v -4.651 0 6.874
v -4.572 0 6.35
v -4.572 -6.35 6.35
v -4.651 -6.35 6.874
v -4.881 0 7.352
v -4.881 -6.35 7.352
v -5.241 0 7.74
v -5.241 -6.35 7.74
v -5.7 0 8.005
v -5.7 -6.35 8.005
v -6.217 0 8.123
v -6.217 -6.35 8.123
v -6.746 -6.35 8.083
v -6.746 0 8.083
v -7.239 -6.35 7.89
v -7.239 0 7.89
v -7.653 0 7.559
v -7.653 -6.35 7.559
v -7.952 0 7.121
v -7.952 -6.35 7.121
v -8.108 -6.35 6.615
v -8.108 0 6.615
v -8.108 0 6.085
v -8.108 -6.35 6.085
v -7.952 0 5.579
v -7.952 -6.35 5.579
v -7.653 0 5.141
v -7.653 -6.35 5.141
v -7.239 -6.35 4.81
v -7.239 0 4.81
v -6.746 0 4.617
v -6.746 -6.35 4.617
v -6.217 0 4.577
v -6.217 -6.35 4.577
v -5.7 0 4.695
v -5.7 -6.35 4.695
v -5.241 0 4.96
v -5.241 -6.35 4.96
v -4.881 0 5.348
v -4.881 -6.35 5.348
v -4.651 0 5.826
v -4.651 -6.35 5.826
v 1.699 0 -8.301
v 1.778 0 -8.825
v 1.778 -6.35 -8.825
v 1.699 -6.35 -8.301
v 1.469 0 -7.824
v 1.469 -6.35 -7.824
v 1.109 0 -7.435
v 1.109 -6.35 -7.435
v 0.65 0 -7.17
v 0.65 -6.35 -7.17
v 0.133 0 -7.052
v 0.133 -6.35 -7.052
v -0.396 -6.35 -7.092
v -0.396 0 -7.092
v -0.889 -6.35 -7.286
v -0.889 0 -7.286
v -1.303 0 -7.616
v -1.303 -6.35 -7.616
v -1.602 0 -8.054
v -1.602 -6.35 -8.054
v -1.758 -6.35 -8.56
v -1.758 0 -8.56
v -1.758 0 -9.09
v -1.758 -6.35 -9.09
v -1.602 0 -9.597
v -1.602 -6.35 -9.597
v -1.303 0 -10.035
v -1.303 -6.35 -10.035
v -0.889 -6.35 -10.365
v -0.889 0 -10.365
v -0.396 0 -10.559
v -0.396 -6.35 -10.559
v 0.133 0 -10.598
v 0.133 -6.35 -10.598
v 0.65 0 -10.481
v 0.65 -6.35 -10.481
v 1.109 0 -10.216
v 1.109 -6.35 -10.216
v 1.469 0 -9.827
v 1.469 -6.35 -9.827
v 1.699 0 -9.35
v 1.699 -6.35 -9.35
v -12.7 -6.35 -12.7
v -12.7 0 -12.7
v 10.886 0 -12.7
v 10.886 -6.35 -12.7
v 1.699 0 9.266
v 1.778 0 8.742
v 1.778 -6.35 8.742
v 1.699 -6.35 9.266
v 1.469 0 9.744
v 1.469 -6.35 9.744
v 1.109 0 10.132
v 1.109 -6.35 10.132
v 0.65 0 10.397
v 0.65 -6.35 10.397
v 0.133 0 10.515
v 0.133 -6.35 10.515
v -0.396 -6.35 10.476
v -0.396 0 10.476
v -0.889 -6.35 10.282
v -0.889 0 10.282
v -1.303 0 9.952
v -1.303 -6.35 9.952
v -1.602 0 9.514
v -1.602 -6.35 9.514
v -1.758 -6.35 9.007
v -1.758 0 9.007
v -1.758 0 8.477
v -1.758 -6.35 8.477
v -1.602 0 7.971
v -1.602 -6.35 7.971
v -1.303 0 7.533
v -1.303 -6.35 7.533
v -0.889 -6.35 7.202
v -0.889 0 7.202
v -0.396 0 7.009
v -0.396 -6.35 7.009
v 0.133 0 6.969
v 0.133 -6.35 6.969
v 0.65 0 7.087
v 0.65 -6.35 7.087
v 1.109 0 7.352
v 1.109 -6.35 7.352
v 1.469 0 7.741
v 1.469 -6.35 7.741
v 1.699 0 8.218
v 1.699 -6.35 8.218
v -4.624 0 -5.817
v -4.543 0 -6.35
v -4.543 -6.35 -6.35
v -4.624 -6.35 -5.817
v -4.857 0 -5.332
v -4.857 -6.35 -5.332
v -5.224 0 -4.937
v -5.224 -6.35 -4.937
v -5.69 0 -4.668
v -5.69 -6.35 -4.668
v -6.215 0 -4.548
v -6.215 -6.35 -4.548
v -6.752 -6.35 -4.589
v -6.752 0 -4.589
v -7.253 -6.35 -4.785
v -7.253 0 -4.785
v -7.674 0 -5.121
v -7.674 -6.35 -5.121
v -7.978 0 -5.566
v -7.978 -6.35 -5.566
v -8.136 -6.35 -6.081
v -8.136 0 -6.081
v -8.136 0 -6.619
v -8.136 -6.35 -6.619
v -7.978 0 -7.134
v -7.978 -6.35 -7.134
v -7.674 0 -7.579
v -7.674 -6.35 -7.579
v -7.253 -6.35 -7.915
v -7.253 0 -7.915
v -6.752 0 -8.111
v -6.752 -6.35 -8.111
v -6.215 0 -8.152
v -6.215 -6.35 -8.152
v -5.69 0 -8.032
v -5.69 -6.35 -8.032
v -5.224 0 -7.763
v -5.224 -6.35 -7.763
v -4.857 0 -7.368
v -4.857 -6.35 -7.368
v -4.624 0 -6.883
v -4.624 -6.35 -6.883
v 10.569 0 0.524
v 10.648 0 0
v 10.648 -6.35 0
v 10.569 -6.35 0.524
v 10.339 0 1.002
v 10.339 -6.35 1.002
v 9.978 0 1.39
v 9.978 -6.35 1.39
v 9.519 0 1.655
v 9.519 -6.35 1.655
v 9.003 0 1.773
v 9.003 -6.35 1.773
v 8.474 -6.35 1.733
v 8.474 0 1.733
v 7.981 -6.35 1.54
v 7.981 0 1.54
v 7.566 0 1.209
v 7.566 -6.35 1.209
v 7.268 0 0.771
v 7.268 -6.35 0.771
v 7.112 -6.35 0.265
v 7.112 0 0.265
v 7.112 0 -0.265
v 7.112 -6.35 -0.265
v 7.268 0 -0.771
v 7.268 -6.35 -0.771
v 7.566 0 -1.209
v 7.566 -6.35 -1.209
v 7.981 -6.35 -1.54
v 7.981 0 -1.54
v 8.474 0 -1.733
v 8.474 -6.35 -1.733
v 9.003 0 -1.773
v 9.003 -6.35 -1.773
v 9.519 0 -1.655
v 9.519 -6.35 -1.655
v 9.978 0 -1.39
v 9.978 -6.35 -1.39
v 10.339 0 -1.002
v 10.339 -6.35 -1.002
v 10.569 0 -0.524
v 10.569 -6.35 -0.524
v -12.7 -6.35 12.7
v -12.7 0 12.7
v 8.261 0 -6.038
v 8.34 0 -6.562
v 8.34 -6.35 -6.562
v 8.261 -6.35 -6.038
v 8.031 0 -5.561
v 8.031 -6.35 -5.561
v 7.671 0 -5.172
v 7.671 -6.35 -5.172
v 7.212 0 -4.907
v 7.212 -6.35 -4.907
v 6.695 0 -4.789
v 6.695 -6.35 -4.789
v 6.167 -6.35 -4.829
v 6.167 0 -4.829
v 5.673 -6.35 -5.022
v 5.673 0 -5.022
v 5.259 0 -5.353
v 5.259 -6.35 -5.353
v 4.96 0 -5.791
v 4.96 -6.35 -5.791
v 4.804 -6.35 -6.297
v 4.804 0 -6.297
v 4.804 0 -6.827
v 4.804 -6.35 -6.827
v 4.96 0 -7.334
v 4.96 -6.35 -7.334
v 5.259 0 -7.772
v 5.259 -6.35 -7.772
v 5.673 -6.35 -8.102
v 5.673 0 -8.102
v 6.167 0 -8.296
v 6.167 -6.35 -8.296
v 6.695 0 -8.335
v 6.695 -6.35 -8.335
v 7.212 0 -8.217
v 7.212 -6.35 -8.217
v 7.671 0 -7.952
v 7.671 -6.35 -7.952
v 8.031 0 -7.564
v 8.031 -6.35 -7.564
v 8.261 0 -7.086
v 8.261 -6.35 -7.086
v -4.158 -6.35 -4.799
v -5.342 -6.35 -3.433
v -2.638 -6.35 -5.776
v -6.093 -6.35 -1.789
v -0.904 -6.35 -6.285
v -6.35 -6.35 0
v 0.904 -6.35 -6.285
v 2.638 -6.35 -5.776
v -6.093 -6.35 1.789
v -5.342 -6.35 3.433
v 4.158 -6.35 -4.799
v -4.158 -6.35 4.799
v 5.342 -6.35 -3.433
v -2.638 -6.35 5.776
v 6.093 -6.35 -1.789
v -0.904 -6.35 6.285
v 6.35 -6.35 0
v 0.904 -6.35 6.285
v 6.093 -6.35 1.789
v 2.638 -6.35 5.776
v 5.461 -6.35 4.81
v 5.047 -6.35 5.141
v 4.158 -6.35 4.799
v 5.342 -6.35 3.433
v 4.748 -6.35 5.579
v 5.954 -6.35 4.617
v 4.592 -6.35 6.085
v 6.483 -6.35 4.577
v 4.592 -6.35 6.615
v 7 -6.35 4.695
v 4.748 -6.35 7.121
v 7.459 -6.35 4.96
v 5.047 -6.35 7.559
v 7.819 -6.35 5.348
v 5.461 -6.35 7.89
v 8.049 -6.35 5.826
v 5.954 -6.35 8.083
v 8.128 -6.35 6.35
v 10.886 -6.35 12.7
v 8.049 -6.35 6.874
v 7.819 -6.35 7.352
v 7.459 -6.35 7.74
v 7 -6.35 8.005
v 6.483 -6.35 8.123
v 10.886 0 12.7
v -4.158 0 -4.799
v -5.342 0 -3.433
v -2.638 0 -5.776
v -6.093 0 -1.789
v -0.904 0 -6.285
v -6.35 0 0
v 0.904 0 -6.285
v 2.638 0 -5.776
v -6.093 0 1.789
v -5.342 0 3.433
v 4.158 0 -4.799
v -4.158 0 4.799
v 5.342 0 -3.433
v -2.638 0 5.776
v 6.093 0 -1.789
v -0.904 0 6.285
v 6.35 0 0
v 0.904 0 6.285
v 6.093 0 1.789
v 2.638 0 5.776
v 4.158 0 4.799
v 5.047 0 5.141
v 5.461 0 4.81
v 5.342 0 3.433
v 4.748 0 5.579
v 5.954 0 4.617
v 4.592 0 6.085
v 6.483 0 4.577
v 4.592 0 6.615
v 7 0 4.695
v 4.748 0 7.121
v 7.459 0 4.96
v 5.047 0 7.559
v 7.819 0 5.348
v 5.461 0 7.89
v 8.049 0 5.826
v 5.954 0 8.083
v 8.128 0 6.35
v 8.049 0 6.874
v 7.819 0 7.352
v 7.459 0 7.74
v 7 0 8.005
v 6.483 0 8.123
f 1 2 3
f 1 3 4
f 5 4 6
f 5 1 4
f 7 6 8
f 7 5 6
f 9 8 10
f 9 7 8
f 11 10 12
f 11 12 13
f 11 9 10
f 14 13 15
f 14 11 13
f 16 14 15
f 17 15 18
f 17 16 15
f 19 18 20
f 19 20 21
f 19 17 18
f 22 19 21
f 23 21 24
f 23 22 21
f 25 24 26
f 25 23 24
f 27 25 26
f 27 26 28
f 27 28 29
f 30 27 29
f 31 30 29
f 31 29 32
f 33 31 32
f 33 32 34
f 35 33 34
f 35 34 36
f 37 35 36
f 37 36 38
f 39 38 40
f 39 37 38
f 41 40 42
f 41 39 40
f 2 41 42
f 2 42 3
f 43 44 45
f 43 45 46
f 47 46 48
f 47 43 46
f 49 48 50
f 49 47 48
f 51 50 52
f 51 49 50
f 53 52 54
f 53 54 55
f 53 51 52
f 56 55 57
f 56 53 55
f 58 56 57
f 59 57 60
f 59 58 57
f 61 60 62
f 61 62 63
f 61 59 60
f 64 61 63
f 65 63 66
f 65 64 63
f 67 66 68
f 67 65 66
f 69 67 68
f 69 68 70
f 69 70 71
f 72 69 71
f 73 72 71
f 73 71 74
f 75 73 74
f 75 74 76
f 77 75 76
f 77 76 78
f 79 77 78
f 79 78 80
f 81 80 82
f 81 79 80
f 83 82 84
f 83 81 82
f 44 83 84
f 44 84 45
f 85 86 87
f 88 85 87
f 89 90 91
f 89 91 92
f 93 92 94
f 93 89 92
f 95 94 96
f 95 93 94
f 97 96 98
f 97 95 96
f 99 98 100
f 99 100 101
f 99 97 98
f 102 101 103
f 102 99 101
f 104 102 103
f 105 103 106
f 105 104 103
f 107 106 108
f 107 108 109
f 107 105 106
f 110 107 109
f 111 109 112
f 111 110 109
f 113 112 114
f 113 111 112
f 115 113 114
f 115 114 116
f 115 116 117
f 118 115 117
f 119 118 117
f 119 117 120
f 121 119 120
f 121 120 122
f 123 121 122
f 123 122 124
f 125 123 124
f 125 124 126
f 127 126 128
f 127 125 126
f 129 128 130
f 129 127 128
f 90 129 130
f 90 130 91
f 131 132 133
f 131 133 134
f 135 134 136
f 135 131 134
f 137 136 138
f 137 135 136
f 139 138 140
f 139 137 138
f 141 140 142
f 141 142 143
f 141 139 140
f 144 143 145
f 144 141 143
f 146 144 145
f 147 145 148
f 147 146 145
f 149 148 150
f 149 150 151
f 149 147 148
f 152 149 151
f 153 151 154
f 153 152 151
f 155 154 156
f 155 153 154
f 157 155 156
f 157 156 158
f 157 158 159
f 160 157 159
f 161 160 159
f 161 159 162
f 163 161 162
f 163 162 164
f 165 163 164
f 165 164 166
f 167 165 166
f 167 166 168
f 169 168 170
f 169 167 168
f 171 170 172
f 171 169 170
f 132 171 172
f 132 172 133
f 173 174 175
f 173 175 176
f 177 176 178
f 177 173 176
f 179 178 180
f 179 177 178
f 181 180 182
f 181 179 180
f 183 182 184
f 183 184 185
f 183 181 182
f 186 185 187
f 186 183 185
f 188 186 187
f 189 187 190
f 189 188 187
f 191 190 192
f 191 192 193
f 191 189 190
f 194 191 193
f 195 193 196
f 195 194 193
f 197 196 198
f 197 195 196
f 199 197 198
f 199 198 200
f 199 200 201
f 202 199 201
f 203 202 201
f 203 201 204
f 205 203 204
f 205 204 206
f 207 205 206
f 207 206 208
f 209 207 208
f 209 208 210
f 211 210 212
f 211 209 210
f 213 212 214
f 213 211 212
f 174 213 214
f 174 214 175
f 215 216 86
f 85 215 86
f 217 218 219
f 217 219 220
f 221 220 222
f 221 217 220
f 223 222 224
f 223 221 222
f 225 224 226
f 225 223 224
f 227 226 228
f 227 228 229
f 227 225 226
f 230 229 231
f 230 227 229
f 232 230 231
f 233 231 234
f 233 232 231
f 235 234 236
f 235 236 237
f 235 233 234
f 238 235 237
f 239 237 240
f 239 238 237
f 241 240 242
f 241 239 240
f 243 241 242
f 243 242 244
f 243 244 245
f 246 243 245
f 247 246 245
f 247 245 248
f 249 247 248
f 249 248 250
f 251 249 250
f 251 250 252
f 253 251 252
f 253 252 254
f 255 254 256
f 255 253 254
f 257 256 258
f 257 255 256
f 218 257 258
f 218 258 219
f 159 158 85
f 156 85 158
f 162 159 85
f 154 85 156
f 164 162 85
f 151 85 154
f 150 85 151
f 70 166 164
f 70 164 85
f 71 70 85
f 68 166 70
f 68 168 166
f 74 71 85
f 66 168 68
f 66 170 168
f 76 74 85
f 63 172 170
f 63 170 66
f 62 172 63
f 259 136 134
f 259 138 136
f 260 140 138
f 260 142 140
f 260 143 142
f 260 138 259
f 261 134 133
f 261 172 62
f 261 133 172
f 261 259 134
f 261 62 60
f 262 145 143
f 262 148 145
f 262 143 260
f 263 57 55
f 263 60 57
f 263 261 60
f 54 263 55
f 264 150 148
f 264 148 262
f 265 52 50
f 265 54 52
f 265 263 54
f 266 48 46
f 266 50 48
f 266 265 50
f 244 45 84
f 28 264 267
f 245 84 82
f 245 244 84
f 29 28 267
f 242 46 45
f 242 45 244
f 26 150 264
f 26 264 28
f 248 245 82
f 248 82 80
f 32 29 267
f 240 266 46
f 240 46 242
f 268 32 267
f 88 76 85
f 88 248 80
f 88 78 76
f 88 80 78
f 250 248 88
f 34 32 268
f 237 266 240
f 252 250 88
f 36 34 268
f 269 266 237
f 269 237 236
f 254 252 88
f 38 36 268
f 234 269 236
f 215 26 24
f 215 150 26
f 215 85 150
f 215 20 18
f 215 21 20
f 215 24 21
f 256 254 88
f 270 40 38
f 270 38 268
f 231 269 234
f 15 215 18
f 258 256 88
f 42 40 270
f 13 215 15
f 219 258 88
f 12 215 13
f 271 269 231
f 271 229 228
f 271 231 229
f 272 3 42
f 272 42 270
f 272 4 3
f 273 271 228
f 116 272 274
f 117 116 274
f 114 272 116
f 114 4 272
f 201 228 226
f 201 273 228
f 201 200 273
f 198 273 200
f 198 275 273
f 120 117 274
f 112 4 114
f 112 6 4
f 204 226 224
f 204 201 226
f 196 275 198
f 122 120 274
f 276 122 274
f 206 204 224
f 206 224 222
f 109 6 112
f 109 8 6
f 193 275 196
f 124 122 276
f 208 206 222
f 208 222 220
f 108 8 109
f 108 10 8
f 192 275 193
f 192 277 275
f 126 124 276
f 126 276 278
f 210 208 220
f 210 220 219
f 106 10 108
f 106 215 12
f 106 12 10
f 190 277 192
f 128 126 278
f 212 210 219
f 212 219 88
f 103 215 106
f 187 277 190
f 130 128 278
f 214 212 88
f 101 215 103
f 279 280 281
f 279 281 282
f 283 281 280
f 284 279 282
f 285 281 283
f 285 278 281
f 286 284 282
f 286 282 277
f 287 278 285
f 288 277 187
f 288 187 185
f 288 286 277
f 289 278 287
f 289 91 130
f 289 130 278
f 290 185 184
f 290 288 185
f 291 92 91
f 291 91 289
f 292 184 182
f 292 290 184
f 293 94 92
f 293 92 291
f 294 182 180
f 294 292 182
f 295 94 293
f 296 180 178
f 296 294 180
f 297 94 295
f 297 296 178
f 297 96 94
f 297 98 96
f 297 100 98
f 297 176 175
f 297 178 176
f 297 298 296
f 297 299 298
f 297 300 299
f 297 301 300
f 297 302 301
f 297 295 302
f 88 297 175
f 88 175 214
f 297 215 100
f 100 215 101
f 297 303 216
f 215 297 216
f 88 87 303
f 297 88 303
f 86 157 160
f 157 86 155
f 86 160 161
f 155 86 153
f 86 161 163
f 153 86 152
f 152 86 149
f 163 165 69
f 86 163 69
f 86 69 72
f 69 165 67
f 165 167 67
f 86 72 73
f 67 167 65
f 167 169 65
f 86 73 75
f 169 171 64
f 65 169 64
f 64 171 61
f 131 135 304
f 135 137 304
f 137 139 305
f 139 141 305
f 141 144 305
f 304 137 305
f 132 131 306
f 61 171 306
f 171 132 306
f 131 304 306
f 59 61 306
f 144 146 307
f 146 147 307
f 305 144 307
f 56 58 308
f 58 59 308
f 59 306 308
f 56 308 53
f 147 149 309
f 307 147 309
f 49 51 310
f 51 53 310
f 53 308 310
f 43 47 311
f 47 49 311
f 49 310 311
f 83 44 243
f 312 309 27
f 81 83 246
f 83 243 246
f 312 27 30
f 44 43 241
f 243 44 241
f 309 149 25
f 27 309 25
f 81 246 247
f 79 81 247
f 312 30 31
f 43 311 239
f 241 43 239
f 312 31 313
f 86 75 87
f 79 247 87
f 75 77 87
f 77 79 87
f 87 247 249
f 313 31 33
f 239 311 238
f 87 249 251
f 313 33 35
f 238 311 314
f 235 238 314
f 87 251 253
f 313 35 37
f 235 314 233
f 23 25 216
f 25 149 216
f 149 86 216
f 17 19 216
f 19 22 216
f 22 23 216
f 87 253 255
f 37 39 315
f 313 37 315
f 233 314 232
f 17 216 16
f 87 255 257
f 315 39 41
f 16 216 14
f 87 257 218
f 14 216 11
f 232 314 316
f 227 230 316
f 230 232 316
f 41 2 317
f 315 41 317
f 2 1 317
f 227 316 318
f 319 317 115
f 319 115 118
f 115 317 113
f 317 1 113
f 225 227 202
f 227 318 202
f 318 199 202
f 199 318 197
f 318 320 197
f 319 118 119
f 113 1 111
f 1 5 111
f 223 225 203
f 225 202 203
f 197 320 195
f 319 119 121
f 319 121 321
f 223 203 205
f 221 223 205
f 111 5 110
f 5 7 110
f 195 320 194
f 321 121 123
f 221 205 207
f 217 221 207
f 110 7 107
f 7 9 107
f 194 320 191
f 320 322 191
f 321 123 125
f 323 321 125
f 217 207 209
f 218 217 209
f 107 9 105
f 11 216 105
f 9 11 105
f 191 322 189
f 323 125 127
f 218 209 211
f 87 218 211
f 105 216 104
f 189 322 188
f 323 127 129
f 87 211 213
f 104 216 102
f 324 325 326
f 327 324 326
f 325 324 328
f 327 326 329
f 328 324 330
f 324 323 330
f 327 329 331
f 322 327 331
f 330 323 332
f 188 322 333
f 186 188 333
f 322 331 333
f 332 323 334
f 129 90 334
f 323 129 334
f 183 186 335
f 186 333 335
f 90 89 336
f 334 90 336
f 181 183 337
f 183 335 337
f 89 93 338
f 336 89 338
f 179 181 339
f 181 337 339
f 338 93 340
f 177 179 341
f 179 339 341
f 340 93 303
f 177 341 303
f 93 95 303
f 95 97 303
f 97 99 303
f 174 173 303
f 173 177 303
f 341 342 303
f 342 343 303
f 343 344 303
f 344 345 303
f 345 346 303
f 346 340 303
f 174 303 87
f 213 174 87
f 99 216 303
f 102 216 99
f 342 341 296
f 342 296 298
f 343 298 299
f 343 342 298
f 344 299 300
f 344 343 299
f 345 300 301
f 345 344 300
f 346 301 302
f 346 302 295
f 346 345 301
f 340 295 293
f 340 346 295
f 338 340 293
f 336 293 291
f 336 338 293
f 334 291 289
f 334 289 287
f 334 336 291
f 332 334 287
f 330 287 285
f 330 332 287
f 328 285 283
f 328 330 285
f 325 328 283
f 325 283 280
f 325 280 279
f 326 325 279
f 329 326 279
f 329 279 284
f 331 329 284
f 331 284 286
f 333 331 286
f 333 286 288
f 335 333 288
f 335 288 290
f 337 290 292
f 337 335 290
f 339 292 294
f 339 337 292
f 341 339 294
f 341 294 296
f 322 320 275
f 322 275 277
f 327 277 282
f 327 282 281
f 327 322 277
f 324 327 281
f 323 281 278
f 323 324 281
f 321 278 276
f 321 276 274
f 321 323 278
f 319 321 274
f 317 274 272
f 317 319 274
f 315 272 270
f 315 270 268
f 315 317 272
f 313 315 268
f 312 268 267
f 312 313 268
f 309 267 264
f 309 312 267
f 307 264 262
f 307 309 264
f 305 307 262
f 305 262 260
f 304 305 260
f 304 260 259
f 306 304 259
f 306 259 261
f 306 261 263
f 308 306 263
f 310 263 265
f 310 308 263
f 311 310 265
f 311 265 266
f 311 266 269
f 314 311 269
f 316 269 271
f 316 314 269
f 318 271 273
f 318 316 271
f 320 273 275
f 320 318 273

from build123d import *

# Parameters (mm, degrees)
F0_R     = 1.806666
F0_R_2   = 1.778
F0_R_3   = 6.35
F1_DEPTH = 6.35


with BuildPart() as f1:
    # F0 (on Front) → F1 (new body)
    with BuildSketch(Plane.XZ):
        Polygon((10.647724, 12.7), (-12.7, 12.7), (-12.7, -12.7), (10.647724, -12.7), (10.886472, -12.7), (10.886472, 12.7), align=None)
        with Locations((-6.35, -6.35)):
            Circle(F0_R, mode=Mode.SUBTRACT)
        with Locations((0, -8.825461)):
            Circle(F0_R_2, mode=Mode.SUBTRACT)
        with Locations((6.562257, -6.562257)):
            Circle(F0_R_2, mode=Mode.SUBTRACT)
        Circle(F0_R_3, mode=Mode.SUBTRACT)
        with Locations((8.869724, 0)):
            Circle(F0_R_2, mode=Mode.SUBTRACT)
        with Locations((-6.35, 6.35)):
            Circle(F0_R_2, mode=Mode.SUBTRACT)
        with Locations((6.35, 6.35)):
            Circle(F0_R_2, mode=Mode.SUBTRACT)
        with Locations((0, 8.742251)):
            Circle(F0_R_2, mode=Mode.SUBTRACT)
    extrude(amount=F1_DEPTH)


solid = f1.part
